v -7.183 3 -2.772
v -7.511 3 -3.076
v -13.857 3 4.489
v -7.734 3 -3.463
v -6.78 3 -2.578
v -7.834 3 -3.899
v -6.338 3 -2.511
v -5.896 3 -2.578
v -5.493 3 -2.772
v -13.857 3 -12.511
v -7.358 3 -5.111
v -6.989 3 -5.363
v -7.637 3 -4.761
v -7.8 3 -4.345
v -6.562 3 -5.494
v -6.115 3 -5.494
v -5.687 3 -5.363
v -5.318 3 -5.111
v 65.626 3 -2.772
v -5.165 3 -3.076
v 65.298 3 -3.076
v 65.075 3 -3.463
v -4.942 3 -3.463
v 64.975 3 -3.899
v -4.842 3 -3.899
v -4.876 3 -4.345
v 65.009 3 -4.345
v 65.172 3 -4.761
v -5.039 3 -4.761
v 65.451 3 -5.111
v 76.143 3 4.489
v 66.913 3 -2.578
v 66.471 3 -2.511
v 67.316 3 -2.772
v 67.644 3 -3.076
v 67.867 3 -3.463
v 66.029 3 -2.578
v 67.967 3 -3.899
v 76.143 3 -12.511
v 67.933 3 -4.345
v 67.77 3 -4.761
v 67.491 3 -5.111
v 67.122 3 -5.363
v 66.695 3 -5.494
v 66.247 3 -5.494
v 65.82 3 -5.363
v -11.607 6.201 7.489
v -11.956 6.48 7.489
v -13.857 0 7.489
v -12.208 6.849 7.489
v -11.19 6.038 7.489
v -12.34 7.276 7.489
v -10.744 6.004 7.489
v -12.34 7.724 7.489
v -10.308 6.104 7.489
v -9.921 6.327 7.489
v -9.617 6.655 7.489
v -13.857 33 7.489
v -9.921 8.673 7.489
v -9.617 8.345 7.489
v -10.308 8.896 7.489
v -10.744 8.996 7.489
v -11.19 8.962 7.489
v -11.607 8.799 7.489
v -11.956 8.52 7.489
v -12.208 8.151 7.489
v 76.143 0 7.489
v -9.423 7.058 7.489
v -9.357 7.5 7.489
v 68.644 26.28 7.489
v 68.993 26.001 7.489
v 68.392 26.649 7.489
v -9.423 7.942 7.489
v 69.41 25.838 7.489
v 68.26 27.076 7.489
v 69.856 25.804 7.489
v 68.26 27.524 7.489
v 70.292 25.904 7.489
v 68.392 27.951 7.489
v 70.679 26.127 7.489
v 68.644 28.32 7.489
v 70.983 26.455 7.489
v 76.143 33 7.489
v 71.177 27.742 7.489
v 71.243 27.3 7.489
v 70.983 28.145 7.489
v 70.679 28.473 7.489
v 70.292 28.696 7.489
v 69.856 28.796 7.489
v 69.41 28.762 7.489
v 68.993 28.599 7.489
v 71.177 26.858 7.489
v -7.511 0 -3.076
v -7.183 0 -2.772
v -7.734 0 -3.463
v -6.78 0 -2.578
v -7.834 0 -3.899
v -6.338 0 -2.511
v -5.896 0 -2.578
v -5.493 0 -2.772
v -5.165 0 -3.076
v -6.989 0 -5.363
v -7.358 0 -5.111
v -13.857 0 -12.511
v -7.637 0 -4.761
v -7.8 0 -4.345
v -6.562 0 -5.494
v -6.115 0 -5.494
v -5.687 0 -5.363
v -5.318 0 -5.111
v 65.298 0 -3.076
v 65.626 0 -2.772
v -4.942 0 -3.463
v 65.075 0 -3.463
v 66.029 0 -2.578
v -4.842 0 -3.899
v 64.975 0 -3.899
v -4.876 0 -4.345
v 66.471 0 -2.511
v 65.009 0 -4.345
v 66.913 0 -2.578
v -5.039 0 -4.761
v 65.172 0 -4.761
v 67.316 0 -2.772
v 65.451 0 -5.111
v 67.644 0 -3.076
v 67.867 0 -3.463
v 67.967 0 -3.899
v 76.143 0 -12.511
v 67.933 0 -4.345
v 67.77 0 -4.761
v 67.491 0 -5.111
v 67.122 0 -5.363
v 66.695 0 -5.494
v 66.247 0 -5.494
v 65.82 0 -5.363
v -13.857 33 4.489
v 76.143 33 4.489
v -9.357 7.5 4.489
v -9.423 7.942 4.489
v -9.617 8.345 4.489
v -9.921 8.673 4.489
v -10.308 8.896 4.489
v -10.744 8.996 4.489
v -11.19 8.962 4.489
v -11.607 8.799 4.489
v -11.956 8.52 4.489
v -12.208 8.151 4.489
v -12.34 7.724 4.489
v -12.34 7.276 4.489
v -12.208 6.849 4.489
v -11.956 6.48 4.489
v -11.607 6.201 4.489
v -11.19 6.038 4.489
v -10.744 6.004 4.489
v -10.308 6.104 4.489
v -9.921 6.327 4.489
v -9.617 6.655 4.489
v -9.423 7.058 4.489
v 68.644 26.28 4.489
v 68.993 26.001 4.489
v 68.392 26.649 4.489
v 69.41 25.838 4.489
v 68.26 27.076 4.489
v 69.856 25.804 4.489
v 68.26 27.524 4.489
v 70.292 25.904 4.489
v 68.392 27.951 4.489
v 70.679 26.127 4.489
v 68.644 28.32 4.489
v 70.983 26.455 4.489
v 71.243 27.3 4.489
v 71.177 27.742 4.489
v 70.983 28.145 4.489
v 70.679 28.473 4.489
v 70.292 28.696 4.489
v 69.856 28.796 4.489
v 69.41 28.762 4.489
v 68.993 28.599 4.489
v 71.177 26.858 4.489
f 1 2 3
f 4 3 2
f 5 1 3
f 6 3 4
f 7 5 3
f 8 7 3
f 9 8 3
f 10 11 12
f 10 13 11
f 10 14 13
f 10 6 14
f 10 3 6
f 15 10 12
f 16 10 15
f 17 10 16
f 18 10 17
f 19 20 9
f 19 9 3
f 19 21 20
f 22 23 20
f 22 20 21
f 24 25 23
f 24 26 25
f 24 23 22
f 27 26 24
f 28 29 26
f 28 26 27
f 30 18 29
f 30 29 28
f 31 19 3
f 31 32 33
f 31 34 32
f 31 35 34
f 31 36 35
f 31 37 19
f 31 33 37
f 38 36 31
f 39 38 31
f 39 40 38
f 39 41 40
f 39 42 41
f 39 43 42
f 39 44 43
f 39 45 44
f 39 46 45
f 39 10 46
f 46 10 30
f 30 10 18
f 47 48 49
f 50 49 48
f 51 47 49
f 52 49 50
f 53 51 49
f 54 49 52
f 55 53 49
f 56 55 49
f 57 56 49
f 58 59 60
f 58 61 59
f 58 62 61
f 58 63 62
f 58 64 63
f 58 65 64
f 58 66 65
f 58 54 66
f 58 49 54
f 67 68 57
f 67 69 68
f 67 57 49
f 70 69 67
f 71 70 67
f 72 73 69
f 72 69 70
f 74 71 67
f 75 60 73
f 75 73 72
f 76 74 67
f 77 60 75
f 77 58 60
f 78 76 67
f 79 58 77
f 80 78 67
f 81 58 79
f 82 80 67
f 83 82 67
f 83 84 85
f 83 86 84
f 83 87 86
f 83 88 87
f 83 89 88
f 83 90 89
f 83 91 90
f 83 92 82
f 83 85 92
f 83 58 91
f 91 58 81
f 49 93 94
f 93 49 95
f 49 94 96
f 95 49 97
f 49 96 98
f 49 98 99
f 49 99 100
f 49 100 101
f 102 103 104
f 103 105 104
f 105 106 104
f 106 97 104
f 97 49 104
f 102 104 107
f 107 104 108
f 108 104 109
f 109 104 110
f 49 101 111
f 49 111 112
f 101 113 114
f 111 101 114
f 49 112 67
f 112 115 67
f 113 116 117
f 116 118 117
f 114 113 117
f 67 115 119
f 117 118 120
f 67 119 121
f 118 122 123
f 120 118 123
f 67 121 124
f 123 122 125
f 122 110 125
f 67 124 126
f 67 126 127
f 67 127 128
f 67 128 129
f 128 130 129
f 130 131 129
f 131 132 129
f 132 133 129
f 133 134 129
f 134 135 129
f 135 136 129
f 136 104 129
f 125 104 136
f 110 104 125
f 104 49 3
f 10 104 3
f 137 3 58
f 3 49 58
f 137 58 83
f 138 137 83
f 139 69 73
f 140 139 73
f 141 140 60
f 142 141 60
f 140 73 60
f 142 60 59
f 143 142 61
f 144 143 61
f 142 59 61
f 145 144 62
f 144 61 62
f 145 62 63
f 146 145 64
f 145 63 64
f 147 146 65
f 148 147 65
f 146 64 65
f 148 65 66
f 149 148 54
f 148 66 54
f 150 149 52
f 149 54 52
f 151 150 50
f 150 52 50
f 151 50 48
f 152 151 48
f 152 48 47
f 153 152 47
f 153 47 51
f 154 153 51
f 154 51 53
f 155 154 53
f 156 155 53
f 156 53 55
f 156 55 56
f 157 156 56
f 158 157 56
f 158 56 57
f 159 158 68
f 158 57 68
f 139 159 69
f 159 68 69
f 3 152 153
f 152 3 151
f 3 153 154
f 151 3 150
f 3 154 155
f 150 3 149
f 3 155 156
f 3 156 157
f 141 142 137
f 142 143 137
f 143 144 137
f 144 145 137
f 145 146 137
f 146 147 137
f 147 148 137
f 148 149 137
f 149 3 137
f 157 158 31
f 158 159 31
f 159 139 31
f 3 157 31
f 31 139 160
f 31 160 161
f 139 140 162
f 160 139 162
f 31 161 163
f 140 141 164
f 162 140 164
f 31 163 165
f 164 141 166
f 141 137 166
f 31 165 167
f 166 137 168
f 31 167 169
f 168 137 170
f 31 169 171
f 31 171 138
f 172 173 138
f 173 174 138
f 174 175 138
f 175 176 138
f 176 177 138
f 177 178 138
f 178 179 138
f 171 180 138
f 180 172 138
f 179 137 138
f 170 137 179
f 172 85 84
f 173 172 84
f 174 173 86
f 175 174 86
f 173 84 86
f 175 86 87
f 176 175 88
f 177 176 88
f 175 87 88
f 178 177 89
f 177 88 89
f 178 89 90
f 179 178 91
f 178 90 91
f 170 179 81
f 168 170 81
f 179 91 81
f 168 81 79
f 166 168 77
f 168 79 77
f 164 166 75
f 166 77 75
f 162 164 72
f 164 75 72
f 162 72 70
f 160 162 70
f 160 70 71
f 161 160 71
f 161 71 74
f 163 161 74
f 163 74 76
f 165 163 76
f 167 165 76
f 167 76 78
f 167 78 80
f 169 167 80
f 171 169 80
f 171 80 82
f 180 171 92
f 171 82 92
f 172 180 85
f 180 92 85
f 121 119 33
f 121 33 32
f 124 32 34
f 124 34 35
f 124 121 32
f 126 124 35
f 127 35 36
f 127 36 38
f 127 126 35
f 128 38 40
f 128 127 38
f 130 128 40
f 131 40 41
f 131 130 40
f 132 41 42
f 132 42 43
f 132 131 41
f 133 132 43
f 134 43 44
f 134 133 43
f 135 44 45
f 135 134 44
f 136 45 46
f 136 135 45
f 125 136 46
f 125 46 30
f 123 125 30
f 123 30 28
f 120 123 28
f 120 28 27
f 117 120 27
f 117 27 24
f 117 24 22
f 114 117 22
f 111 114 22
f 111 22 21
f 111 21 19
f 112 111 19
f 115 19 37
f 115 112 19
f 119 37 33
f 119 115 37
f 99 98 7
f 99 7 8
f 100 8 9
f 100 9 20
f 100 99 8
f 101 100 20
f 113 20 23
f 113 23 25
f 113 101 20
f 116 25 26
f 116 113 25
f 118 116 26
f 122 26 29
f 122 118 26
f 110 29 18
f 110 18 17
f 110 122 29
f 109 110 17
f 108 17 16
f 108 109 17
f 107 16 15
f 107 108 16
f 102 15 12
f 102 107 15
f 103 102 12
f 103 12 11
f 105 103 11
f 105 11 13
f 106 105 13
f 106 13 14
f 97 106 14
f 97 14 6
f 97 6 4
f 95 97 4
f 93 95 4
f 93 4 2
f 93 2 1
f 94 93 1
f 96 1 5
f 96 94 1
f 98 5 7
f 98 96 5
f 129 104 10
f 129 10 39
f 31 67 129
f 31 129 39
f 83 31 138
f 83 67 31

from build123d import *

# Parameters (mm, degrees)
SKETCH1_W           = 90
SKETCH1_H           = 20
SKETCH1_R           = 1.5
BOSS_EXTRUDE1_DEPTH = 3
SKETCH2_W           = 90
SKETCH2_H           = 30
SKETCH2_R           = 1.5
BOSS_EXTRUDE2_DEPTH = 3


with BuildPart() as part:
    # Sketch1 → Boss-Extrude1 (new body)
    with BuildSketch(Plane(origin=(0, 0, 0), x_dir=(1, 0, 0), z_dir=(0, 1, 0))):
        with Locations((31.143497758, 2.511210762)):
            Rectangle(SKETCH1_W, SKETCH1_H)
        with Locations(Location((-6.338089317, 4.011210762, 0), (0, 0, 270))):
            Circle(SKETCH1_R, mode=Mode.SUBTRACT)
        with Locations(Location((66.470970633, 4.011210762, 0), (0, 0, 270))):
            Circle(SKETCH1_R, mode=Mode.SUBTRACT)
    extrude(amount=BOSS_EXTRUDE1_DEPTH)

    # Sketch2 → Boss-Extrude2 (add)
    with BuildSketch(Plane.XY.offset(7.488789238)):
        with Locations((31.143497758, 18)):
            Rectangle(SKETCH2_W, SKETCH2_H)
        with Locations((-10.856502242, 7.5)):
            Circle(SKETCH2_R, mode=Mode.SUBTRACT)
        with Locations((69.743497758, 27.3)):
            Circle(SKETCH2_R, mode=Mode.SUBTRACT)
    extrude(amount=-BOSS_EXTRUDE2_DEPTH)


solid = part.part
